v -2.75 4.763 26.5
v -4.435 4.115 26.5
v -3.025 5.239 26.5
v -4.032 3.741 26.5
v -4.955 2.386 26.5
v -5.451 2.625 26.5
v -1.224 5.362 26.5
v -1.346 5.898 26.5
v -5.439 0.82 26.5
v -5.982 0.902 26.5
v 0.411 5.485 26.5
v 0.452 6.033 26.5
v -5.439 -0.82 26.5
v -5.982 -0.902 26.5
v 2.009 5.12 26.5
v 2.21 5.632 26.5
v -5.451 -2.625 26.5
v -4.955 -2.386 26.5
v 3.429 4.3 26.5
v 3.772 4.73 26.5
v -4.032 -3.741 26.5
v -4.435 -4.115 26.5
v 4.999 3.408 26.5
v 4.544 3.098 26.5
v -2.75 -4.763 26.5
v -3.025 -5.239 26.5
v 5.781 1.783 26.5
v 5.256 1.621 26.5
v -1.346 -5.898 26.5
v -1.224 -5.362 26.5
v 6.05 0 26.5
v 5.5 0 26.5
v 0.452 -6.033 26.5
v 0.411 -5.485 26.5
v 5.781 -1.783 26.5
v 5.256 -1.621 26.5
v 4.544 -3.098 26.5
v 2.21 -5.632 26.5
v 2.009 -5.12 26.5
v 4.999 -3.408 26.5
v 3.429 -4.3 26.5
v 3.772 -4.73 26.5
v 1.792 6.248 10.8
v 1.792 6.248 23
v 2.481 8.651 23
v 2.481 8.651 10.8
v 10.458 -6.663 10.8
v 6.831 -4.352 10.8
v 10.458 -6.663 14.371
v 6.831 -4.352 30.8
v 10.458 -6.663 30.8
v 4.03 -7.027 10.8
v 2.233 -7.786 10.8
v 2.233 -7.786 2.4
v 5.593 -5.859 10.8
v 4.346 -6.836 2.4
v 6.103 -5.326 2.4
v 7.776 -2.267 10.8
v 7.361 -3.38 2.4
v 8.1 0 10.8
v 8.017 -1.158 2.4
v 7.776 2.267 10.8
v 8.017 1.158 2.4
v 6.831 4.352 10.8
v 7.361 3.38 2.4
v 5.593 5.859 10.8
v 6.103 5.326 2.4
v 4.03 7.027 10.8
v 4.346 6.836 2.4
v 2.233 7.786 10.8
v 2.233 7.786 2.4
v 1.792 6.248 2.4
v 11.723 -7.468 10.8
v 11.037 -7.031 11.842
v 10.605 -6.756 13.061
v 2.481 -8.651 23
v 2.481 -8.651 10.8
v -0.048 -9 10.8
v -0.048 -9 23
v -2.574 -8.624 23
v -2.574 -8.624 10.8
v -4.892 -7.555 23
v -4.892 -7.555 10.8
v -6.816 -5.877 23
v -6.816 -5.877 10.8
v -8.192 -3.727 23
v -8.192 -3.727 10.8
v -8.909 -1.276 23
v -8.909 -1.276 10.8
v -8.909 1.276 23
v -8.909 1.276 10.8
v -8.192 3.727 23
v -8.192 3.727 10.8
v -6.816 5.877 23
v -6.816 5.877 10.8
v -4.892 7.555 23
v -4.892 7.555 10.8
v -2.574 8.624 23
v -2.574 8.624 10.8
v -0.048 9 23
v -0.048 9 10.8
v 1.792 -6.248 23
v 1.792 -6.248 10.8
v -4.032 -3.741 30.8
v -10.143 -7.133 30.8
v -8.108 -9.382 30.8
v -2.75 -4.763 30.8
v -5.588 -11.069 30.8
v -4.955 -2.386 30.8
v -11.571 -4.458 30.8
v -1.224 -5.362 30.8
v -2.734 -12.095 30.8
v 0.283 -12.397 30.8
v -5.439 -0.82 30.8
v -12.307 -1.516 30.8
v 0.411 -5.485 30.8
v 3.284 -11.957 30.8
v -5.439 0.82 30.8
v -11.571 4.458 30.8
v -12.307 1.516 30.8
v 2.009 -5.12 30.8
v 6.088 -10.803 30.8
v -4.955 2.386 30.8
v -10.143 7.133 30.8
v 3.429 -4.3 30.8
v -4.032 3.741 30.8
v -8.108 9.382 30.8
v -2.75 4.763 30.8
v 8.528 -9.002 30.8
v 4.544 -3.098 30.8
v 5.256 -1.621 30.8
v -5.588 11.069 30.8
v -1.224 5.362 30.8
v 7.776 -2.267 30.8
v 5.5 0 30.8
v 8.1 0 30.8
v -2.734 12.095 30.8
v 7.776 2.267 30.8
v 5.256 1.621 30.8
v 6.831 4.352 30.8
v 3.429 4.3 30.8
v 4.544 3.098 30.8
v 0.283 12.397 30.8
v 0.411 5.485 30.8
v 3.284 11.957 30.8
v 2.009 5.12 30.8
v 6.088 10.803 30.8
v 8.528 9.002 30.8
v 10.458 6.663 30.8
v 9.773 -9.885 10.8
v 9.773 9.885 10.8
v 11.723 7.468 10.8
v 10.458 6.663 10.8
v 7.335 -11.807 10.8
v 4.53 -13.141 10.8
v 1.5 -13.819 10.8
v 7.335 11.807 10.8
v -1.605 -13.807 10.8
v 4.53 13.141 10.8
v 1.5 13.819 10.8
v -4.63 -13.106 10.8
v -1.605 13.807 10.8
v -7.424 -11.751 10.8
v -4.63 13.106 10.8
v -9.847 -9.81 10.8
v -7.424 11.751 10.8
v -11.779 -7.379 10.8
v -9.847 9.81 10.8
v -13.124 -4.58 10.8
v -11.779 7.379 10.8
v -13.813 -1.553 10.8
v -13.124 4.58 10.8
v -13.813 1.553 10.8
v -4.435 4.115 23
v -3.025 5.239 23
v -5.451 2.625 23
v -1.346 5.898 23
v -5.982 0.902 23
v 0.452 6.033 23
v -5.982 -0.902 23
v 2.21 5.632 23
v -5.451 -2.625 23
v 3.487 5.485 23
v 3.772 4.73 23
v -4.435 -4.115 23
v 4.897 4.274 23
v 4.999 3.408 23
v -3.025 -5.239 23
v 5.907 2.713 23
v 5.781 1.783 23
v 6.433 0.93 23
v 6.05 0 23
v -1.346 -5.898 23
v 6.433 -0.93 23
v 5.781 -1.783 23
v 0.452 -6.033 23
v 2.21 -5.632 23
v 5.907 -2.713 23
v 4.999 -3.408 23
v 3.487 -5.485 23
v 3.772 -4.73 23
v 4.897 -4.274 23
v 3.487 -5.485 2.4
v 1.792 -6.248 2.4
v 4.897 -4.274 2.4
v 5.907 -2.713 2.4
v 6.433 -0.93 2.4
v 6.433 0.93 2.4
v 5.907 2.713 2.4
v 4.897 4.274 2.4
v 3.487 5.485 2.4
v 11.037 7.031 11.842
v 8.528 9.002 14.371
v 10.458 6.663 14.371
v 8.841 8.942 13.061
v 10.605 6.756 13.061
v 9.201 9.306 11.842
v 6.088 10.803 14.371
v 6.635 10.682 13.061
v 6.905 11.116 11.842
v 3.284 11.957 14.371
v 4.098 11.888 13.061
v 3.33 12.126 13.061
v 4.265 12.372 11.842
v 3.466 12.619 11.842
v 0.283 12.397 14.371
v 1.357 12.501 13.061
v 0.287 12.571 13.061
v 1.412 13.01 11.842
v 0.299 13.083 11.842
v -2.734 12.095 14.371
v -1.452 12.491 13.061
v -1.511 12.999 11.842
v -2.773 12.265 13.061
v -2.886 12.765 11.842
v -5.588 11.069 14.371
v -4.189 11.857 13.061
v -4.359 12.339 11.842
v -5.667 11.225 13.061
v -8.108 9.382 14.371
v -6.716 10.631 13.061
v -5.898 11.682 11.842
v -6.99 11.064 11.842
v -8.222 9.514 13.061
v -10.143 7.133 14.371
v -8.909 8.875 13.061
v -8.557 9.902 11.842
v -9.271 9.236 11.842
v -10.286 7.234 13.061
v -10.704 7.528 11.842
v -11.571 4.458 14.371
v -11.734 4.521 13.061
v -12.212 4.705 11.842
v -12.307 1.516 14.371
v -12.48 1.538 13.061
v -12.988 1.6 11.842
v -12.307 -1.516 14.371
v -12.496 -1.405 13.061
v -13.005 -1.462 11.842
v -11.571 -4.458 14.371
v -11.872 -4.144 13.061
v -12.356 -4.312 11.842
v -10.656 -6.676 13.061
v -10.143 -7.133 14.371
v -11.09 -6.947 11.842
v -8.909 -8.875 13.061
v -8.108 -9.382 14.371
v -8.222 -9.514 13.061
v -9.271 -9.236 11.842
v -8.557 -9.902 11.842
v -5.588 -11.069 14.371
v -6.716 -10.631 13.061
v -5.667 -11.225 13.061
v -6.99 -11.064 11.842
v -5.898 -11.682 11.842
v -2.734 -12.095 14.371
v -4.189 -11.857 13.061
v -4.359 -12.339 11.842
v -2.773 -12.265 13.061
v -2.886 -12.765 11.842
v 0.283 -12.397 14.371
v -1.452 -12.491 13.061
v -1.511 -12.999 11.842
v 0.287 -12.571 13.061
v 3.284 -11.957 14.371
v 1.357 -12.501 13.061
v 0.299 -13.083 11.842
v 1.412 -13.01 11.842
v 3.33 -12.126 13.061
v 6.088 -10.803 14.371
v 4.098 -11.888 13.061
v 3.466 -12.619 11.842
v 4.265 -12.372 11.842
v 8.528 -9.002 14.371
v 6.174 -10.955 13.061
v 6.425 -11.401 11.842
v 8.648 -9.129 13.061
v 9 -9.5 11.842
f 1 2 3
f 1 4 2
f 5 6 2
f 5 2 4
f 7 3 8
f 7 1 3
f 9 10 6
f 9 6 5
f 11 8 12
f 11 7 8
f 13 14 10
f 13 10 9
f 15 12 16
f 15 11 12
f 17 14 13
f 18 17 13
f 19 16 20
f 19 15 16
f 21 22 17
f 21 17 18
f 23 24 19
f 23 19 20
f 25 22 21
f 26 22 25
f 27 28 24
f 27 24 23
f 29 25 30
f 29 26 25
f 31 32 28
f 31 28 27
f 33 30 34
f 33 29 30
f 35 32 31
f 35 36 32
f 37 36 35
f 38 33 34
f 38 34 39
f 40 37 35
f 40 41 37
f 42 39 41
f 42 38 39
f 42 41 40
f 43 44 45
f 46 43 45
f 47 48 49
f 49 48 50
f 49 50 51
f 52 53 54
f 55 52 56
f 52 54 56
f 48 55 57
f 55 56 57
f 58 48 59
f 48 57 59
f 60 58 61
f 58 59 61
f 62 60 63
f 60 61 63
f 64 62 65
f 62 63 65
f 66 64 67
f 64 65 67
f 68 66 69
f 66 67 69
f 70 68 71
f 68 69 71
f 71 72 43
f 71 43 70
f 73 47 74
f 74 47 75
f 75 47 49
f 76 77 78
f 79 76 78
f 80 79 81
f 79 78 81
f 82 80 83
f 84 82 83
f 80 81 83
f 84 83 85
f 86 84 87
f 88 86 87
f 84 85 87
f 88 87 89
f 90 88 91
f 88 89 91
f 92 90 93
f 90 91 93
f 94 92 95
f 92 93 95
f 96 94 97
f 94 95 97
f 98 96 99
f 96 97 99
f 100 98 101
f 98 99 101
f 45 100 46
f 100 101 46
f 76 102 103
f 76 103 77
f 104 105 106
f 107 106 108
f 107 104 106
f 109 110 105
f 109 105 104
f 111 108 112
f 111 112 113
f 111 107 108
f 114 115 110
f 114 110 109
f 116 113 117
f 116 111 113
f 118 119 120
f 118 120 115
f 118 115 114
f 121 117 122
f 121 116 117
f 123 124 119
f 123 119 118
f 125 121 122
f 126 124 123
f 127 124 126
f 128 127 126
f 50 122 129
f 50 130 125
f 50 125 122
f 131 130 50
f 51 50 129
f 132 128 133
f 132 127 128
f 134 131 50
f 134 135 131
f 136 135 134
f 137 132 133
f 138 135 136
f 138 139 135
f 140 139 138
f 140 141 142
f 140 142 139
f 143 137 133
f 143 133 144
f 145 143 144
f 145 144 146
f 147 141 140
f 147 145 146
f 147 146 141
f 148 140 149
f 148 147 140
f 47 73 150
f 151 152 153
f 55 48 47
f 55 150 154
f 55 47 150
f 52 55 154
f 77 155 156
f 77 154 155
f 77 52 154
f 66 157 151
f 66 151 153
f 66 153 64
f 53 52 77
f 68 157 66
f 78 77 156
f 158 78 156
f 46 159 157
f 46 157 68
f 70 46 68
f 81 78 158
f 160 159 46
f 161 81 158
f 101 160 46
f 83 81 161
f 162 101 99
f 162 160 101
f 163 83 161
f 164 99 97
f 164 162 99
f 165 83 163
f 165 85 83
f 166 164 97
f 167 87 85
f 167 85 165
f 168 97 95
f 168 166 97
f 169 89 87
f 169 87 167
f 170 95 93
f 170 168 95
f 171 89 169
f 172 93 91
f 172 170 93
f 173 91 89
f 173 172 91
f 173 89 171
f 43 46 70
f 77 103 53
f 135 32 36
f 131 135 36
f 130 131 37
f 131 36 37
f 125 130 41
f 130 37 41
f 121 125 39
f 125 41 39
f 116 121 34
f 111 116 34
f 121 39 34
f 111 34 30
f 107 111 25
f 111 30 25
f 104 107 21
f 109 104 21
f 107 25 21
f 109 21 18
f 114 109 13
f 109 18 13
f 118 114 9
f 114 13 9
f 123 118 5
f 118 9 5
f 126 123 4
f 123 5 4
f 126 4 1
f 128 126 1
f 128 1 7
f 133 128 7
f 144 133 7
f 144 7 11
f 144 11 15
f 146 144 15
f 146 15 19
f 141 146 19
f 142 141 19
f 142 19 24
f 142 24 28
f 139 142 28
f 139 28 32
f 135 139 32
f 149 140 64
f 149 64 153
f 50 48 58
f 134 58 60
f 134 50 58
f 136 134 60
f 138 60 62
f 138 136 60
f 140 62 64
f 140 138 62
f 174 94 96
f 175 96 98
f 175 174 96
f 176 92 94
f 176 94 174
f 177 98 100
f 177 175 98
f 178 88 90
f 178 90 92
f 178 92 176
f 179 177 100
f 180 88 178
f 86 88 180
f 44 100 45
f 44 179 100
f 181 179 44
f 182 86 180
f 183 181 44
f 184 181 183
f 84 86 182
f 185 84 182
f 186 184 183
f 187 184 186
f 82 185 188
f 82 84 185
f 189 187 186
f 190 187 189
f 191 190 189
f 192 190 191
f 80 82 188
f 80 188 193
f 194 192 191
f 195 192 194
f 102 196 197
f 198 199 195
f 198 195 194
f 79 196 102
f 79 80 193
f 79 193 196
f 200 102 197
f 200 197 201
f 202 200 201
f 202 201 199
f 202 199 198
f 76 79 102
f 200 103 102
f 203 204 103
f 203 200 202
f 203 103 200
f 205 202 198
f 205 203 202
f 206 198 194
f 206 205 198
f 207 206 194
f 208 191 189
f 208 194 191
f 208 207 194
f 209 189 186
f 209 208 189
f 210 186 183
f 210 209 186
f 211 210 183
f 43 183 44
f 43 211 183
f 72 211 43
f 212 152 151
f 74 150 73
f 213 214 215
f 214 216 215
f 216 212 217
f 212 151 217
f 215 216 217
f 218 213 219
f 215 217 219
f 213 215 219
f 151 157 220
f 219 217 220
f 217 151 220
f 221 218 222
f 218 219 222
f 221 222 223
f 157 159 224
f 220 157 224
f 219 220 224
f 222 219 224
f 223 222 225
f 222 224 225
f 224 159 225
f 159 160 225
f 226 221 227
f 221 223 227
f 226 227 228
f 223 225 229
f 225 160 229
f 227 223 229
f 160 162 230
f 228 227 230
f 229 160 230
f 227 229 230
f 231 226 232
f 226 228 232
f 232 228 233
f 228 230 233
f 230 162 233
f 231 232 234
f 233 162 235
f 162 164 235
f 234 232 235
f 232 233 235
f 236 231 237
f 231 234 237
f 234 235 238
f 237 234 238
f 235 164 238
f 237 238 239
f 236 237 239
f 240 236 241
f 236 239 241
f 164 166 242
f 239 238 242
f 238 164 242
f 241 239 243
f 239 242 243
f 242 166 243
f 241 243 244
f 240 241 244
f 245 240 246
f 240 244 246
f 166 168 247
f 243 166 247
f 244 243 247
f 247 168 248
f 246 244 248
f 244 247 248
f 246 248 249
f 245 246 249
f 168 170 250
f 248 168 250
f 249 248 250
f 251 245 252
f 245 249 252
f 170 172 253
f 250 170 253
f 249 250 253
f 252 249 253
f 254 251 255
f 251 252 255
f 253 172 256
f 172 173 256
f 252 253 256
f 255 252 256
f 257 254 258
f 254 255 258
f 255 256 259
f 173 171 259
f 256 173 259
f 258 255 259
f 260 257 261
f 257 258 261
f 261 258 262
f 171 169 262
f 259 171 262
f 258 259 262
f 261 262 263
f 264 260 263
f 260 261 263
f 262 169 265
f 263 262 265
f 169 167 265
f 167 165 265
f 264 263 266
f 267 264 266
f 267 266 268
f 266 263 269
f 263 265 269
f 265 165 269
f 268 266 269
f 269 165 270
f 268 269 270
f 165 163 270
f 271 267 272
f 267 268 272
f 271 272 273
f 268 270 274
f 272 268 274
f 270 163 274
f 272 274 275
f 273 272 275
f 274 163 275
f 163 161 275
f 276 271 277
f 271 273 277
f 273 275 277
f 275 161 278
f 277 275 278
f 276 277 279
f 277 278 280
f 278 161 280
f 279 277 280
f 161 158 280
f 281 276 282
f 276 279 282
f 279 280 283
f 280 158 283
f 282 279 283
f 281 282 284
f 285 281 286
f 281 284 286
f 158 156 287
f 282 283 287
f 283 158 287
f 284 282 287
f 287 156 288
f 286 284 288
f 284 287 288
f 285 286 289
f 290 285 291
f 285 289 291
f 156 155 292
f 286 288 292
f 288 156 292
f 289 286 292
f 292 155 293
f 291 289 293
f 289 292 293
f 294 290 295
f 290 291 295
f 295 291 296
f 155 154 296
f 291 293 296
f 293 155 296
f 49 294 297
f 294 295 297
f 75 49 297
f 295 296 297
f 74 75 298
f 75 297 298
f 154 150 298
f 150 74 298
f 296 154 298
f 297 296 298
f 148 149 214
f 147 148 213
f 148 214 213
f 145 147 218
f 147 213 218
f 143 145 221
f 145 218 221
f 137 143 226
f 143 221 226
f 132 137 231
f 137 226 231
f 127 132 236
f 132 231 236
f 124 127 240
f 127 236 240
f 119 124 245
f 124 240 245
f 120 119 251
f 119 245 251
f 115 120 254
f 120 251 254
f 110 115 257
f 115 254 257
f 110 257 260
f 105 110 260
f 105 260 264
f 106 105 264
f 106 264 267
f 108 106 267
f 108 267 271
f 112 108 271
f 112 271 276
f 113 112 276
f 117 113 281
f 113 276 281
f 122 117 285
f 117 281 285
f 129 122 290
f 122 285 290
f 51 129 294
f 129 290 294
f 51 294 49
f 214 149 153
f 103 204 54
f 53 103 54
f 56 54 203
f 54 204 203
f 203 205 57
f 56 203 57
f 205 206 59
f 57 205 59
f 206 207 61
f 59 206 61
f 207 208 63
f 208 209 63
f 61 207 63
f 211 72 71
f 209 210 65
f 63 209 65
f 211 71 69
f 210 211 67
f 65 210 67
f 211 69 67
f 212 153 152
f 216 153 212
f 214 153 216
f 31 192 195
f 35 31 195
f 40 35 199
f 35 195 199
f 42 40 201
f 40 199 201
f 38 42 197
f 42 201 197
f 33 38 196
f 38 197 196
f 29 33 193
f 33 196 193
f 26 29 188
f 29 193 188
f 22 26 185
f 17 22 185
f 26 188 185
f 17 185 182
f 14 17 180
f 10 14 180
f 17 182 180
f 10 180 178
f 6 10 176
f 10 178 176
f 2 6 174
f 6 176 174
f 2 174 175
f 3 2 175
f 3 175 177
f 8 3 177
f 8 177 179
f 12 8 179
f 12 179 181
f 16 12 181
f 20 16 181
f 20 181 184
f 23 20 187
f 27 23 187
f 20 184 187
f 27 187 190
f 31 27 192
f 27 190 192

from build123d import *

# Parameters (mm, degrees)
SKETCH050_R      = 12.4
PAD022_DEPTH     = 20
PAD027_DEPTH     = 8.4
POCKET009_DEPTH  = 12.2
SKETCH057_R      = 6.05
POCKET010_DEPTH  = 3.5
SKETCH058_R      = 5.5
POCKET011_DEPTH  = 4.301
POCKET012_DEPTH  = 28.401
REVOLUTION_ANGLE = 295


with BuildPart() as part:
    # Sketch050 → Pad022 (new body)
    with BuildSketch(Plane.XY.offset(8.4)):
        Circle(SKETCH050_R)
    extrude(amount=PAD022_DEPTH)

    # Sketch049 → Pad027 (join)
    with BuildSketch(Plane.XY):
        with BuildLine():
            ThreePointArc((2.232663, -7.78622), (8.1, 0), (2.232663, 7.78622))
            Line((1.791643, 6.248201), (2.232663, 7.78622))
            ThreePointArc((1.791643, -6.248201), (6.5, 0), (1.791643, 6.248201))
            Line((1.791643, -6.248201), (2.232663, -7.78622))
        make_face()
    extrude(amount=PAD027_DEPTH)

    # Sketch056 → Pocket009 (cut)
    with BuildSketch(Plane(origin=(0, 0, 8.4), x_dir=(1, 0, 0), z_dir=(0, 0, -1))):
        with BuildLine():
            ThreePointArc((2.480736, 8.651355), (-9, 0), (2.480736, -8.651355))
            Line((1.791643, -6.248201), (2.480736, -8.651355))
            ThreePointArc((1.791643, -6.248201), (6.5, 0), (1.791643, 6.248201))
            Line((1.791643, 6.248201), (2.480736, 8.651355))
        make_face()
    extrude(amount=-POCKET009_DEPTH, mode=Mode.SUBTRACT)

    # Sketch057 (on Face10 of Pocket009) → Pocket010 (cut)
    with BuildSketch(Plane(origin=(0, 0, 20.6), x_dir=(1, 0, 0), z_dir=(0, 0, -1))):
        Circle(SKETCH057_R)
    extrude(amount=-POCKET010_DEPTH, mode=Mode.SUBTRACT)

    # Sketch058 → Pocket011 (cut, through all)
    with BuildSketch(Plane(origin=(0, 0, 24.1), x_dir=(1, 0, 0), z_dir=(0, 0, -1))):
        Circle(SKETCH058_R)
    extrude(amount=-POCKET011_DEPTH, mode=Mode.SUBTRACT)

    # Sketch055 (on Face3 of Pocket011) → Pocket012 (cut, through all)
    with BuildSketch(Plane.XY.offset(28.4)):
        with BuildLine():
            ThreePointArc((10.458054, -6.662515), (12.4, 0), (10.458054, 6.662515))
            Line((6.831471, 4.352127), (10.458054, 6.662515))
            ThreePointArc((6.831471, -4.352127), (8.1, 0), (6.831471, 4.352127))
            Line((6.831471, -4.352127), (10.458054, -6.662515))
        make_face()
    extrude(amount=-POCKET012_DEPTH, mode=Mode.SUBTRACT)

    # Sketch059 (on Face5 of Pocket012) → Revolution (revolve)
    with BuildSketch(Plane(origin=(0, 0, 8.4), x_dir=(0.843391, 0.5373, 0), z_dir=(0.5373, -0.843391, 0))):
        with BuildLine():
            Line((12.4, 0), (13.9, 0))
            ThreePointArc((12.4, 3.570696), (12.790231, 1.634214), (13.9, 0))
            Line((12.4, 3.570696), (12.4, 0))
        make_face()
    revolve(axis=Axis((0, 0, 8.4), (0, 0, 1)), revolution_arc=REVOLUTION_ANGLE)


with BuildPart() as part_1:
    # Body006 placement: moved
    add(part.part.moved(Location((0, 0, 2.4))))


solid = part_1.part
